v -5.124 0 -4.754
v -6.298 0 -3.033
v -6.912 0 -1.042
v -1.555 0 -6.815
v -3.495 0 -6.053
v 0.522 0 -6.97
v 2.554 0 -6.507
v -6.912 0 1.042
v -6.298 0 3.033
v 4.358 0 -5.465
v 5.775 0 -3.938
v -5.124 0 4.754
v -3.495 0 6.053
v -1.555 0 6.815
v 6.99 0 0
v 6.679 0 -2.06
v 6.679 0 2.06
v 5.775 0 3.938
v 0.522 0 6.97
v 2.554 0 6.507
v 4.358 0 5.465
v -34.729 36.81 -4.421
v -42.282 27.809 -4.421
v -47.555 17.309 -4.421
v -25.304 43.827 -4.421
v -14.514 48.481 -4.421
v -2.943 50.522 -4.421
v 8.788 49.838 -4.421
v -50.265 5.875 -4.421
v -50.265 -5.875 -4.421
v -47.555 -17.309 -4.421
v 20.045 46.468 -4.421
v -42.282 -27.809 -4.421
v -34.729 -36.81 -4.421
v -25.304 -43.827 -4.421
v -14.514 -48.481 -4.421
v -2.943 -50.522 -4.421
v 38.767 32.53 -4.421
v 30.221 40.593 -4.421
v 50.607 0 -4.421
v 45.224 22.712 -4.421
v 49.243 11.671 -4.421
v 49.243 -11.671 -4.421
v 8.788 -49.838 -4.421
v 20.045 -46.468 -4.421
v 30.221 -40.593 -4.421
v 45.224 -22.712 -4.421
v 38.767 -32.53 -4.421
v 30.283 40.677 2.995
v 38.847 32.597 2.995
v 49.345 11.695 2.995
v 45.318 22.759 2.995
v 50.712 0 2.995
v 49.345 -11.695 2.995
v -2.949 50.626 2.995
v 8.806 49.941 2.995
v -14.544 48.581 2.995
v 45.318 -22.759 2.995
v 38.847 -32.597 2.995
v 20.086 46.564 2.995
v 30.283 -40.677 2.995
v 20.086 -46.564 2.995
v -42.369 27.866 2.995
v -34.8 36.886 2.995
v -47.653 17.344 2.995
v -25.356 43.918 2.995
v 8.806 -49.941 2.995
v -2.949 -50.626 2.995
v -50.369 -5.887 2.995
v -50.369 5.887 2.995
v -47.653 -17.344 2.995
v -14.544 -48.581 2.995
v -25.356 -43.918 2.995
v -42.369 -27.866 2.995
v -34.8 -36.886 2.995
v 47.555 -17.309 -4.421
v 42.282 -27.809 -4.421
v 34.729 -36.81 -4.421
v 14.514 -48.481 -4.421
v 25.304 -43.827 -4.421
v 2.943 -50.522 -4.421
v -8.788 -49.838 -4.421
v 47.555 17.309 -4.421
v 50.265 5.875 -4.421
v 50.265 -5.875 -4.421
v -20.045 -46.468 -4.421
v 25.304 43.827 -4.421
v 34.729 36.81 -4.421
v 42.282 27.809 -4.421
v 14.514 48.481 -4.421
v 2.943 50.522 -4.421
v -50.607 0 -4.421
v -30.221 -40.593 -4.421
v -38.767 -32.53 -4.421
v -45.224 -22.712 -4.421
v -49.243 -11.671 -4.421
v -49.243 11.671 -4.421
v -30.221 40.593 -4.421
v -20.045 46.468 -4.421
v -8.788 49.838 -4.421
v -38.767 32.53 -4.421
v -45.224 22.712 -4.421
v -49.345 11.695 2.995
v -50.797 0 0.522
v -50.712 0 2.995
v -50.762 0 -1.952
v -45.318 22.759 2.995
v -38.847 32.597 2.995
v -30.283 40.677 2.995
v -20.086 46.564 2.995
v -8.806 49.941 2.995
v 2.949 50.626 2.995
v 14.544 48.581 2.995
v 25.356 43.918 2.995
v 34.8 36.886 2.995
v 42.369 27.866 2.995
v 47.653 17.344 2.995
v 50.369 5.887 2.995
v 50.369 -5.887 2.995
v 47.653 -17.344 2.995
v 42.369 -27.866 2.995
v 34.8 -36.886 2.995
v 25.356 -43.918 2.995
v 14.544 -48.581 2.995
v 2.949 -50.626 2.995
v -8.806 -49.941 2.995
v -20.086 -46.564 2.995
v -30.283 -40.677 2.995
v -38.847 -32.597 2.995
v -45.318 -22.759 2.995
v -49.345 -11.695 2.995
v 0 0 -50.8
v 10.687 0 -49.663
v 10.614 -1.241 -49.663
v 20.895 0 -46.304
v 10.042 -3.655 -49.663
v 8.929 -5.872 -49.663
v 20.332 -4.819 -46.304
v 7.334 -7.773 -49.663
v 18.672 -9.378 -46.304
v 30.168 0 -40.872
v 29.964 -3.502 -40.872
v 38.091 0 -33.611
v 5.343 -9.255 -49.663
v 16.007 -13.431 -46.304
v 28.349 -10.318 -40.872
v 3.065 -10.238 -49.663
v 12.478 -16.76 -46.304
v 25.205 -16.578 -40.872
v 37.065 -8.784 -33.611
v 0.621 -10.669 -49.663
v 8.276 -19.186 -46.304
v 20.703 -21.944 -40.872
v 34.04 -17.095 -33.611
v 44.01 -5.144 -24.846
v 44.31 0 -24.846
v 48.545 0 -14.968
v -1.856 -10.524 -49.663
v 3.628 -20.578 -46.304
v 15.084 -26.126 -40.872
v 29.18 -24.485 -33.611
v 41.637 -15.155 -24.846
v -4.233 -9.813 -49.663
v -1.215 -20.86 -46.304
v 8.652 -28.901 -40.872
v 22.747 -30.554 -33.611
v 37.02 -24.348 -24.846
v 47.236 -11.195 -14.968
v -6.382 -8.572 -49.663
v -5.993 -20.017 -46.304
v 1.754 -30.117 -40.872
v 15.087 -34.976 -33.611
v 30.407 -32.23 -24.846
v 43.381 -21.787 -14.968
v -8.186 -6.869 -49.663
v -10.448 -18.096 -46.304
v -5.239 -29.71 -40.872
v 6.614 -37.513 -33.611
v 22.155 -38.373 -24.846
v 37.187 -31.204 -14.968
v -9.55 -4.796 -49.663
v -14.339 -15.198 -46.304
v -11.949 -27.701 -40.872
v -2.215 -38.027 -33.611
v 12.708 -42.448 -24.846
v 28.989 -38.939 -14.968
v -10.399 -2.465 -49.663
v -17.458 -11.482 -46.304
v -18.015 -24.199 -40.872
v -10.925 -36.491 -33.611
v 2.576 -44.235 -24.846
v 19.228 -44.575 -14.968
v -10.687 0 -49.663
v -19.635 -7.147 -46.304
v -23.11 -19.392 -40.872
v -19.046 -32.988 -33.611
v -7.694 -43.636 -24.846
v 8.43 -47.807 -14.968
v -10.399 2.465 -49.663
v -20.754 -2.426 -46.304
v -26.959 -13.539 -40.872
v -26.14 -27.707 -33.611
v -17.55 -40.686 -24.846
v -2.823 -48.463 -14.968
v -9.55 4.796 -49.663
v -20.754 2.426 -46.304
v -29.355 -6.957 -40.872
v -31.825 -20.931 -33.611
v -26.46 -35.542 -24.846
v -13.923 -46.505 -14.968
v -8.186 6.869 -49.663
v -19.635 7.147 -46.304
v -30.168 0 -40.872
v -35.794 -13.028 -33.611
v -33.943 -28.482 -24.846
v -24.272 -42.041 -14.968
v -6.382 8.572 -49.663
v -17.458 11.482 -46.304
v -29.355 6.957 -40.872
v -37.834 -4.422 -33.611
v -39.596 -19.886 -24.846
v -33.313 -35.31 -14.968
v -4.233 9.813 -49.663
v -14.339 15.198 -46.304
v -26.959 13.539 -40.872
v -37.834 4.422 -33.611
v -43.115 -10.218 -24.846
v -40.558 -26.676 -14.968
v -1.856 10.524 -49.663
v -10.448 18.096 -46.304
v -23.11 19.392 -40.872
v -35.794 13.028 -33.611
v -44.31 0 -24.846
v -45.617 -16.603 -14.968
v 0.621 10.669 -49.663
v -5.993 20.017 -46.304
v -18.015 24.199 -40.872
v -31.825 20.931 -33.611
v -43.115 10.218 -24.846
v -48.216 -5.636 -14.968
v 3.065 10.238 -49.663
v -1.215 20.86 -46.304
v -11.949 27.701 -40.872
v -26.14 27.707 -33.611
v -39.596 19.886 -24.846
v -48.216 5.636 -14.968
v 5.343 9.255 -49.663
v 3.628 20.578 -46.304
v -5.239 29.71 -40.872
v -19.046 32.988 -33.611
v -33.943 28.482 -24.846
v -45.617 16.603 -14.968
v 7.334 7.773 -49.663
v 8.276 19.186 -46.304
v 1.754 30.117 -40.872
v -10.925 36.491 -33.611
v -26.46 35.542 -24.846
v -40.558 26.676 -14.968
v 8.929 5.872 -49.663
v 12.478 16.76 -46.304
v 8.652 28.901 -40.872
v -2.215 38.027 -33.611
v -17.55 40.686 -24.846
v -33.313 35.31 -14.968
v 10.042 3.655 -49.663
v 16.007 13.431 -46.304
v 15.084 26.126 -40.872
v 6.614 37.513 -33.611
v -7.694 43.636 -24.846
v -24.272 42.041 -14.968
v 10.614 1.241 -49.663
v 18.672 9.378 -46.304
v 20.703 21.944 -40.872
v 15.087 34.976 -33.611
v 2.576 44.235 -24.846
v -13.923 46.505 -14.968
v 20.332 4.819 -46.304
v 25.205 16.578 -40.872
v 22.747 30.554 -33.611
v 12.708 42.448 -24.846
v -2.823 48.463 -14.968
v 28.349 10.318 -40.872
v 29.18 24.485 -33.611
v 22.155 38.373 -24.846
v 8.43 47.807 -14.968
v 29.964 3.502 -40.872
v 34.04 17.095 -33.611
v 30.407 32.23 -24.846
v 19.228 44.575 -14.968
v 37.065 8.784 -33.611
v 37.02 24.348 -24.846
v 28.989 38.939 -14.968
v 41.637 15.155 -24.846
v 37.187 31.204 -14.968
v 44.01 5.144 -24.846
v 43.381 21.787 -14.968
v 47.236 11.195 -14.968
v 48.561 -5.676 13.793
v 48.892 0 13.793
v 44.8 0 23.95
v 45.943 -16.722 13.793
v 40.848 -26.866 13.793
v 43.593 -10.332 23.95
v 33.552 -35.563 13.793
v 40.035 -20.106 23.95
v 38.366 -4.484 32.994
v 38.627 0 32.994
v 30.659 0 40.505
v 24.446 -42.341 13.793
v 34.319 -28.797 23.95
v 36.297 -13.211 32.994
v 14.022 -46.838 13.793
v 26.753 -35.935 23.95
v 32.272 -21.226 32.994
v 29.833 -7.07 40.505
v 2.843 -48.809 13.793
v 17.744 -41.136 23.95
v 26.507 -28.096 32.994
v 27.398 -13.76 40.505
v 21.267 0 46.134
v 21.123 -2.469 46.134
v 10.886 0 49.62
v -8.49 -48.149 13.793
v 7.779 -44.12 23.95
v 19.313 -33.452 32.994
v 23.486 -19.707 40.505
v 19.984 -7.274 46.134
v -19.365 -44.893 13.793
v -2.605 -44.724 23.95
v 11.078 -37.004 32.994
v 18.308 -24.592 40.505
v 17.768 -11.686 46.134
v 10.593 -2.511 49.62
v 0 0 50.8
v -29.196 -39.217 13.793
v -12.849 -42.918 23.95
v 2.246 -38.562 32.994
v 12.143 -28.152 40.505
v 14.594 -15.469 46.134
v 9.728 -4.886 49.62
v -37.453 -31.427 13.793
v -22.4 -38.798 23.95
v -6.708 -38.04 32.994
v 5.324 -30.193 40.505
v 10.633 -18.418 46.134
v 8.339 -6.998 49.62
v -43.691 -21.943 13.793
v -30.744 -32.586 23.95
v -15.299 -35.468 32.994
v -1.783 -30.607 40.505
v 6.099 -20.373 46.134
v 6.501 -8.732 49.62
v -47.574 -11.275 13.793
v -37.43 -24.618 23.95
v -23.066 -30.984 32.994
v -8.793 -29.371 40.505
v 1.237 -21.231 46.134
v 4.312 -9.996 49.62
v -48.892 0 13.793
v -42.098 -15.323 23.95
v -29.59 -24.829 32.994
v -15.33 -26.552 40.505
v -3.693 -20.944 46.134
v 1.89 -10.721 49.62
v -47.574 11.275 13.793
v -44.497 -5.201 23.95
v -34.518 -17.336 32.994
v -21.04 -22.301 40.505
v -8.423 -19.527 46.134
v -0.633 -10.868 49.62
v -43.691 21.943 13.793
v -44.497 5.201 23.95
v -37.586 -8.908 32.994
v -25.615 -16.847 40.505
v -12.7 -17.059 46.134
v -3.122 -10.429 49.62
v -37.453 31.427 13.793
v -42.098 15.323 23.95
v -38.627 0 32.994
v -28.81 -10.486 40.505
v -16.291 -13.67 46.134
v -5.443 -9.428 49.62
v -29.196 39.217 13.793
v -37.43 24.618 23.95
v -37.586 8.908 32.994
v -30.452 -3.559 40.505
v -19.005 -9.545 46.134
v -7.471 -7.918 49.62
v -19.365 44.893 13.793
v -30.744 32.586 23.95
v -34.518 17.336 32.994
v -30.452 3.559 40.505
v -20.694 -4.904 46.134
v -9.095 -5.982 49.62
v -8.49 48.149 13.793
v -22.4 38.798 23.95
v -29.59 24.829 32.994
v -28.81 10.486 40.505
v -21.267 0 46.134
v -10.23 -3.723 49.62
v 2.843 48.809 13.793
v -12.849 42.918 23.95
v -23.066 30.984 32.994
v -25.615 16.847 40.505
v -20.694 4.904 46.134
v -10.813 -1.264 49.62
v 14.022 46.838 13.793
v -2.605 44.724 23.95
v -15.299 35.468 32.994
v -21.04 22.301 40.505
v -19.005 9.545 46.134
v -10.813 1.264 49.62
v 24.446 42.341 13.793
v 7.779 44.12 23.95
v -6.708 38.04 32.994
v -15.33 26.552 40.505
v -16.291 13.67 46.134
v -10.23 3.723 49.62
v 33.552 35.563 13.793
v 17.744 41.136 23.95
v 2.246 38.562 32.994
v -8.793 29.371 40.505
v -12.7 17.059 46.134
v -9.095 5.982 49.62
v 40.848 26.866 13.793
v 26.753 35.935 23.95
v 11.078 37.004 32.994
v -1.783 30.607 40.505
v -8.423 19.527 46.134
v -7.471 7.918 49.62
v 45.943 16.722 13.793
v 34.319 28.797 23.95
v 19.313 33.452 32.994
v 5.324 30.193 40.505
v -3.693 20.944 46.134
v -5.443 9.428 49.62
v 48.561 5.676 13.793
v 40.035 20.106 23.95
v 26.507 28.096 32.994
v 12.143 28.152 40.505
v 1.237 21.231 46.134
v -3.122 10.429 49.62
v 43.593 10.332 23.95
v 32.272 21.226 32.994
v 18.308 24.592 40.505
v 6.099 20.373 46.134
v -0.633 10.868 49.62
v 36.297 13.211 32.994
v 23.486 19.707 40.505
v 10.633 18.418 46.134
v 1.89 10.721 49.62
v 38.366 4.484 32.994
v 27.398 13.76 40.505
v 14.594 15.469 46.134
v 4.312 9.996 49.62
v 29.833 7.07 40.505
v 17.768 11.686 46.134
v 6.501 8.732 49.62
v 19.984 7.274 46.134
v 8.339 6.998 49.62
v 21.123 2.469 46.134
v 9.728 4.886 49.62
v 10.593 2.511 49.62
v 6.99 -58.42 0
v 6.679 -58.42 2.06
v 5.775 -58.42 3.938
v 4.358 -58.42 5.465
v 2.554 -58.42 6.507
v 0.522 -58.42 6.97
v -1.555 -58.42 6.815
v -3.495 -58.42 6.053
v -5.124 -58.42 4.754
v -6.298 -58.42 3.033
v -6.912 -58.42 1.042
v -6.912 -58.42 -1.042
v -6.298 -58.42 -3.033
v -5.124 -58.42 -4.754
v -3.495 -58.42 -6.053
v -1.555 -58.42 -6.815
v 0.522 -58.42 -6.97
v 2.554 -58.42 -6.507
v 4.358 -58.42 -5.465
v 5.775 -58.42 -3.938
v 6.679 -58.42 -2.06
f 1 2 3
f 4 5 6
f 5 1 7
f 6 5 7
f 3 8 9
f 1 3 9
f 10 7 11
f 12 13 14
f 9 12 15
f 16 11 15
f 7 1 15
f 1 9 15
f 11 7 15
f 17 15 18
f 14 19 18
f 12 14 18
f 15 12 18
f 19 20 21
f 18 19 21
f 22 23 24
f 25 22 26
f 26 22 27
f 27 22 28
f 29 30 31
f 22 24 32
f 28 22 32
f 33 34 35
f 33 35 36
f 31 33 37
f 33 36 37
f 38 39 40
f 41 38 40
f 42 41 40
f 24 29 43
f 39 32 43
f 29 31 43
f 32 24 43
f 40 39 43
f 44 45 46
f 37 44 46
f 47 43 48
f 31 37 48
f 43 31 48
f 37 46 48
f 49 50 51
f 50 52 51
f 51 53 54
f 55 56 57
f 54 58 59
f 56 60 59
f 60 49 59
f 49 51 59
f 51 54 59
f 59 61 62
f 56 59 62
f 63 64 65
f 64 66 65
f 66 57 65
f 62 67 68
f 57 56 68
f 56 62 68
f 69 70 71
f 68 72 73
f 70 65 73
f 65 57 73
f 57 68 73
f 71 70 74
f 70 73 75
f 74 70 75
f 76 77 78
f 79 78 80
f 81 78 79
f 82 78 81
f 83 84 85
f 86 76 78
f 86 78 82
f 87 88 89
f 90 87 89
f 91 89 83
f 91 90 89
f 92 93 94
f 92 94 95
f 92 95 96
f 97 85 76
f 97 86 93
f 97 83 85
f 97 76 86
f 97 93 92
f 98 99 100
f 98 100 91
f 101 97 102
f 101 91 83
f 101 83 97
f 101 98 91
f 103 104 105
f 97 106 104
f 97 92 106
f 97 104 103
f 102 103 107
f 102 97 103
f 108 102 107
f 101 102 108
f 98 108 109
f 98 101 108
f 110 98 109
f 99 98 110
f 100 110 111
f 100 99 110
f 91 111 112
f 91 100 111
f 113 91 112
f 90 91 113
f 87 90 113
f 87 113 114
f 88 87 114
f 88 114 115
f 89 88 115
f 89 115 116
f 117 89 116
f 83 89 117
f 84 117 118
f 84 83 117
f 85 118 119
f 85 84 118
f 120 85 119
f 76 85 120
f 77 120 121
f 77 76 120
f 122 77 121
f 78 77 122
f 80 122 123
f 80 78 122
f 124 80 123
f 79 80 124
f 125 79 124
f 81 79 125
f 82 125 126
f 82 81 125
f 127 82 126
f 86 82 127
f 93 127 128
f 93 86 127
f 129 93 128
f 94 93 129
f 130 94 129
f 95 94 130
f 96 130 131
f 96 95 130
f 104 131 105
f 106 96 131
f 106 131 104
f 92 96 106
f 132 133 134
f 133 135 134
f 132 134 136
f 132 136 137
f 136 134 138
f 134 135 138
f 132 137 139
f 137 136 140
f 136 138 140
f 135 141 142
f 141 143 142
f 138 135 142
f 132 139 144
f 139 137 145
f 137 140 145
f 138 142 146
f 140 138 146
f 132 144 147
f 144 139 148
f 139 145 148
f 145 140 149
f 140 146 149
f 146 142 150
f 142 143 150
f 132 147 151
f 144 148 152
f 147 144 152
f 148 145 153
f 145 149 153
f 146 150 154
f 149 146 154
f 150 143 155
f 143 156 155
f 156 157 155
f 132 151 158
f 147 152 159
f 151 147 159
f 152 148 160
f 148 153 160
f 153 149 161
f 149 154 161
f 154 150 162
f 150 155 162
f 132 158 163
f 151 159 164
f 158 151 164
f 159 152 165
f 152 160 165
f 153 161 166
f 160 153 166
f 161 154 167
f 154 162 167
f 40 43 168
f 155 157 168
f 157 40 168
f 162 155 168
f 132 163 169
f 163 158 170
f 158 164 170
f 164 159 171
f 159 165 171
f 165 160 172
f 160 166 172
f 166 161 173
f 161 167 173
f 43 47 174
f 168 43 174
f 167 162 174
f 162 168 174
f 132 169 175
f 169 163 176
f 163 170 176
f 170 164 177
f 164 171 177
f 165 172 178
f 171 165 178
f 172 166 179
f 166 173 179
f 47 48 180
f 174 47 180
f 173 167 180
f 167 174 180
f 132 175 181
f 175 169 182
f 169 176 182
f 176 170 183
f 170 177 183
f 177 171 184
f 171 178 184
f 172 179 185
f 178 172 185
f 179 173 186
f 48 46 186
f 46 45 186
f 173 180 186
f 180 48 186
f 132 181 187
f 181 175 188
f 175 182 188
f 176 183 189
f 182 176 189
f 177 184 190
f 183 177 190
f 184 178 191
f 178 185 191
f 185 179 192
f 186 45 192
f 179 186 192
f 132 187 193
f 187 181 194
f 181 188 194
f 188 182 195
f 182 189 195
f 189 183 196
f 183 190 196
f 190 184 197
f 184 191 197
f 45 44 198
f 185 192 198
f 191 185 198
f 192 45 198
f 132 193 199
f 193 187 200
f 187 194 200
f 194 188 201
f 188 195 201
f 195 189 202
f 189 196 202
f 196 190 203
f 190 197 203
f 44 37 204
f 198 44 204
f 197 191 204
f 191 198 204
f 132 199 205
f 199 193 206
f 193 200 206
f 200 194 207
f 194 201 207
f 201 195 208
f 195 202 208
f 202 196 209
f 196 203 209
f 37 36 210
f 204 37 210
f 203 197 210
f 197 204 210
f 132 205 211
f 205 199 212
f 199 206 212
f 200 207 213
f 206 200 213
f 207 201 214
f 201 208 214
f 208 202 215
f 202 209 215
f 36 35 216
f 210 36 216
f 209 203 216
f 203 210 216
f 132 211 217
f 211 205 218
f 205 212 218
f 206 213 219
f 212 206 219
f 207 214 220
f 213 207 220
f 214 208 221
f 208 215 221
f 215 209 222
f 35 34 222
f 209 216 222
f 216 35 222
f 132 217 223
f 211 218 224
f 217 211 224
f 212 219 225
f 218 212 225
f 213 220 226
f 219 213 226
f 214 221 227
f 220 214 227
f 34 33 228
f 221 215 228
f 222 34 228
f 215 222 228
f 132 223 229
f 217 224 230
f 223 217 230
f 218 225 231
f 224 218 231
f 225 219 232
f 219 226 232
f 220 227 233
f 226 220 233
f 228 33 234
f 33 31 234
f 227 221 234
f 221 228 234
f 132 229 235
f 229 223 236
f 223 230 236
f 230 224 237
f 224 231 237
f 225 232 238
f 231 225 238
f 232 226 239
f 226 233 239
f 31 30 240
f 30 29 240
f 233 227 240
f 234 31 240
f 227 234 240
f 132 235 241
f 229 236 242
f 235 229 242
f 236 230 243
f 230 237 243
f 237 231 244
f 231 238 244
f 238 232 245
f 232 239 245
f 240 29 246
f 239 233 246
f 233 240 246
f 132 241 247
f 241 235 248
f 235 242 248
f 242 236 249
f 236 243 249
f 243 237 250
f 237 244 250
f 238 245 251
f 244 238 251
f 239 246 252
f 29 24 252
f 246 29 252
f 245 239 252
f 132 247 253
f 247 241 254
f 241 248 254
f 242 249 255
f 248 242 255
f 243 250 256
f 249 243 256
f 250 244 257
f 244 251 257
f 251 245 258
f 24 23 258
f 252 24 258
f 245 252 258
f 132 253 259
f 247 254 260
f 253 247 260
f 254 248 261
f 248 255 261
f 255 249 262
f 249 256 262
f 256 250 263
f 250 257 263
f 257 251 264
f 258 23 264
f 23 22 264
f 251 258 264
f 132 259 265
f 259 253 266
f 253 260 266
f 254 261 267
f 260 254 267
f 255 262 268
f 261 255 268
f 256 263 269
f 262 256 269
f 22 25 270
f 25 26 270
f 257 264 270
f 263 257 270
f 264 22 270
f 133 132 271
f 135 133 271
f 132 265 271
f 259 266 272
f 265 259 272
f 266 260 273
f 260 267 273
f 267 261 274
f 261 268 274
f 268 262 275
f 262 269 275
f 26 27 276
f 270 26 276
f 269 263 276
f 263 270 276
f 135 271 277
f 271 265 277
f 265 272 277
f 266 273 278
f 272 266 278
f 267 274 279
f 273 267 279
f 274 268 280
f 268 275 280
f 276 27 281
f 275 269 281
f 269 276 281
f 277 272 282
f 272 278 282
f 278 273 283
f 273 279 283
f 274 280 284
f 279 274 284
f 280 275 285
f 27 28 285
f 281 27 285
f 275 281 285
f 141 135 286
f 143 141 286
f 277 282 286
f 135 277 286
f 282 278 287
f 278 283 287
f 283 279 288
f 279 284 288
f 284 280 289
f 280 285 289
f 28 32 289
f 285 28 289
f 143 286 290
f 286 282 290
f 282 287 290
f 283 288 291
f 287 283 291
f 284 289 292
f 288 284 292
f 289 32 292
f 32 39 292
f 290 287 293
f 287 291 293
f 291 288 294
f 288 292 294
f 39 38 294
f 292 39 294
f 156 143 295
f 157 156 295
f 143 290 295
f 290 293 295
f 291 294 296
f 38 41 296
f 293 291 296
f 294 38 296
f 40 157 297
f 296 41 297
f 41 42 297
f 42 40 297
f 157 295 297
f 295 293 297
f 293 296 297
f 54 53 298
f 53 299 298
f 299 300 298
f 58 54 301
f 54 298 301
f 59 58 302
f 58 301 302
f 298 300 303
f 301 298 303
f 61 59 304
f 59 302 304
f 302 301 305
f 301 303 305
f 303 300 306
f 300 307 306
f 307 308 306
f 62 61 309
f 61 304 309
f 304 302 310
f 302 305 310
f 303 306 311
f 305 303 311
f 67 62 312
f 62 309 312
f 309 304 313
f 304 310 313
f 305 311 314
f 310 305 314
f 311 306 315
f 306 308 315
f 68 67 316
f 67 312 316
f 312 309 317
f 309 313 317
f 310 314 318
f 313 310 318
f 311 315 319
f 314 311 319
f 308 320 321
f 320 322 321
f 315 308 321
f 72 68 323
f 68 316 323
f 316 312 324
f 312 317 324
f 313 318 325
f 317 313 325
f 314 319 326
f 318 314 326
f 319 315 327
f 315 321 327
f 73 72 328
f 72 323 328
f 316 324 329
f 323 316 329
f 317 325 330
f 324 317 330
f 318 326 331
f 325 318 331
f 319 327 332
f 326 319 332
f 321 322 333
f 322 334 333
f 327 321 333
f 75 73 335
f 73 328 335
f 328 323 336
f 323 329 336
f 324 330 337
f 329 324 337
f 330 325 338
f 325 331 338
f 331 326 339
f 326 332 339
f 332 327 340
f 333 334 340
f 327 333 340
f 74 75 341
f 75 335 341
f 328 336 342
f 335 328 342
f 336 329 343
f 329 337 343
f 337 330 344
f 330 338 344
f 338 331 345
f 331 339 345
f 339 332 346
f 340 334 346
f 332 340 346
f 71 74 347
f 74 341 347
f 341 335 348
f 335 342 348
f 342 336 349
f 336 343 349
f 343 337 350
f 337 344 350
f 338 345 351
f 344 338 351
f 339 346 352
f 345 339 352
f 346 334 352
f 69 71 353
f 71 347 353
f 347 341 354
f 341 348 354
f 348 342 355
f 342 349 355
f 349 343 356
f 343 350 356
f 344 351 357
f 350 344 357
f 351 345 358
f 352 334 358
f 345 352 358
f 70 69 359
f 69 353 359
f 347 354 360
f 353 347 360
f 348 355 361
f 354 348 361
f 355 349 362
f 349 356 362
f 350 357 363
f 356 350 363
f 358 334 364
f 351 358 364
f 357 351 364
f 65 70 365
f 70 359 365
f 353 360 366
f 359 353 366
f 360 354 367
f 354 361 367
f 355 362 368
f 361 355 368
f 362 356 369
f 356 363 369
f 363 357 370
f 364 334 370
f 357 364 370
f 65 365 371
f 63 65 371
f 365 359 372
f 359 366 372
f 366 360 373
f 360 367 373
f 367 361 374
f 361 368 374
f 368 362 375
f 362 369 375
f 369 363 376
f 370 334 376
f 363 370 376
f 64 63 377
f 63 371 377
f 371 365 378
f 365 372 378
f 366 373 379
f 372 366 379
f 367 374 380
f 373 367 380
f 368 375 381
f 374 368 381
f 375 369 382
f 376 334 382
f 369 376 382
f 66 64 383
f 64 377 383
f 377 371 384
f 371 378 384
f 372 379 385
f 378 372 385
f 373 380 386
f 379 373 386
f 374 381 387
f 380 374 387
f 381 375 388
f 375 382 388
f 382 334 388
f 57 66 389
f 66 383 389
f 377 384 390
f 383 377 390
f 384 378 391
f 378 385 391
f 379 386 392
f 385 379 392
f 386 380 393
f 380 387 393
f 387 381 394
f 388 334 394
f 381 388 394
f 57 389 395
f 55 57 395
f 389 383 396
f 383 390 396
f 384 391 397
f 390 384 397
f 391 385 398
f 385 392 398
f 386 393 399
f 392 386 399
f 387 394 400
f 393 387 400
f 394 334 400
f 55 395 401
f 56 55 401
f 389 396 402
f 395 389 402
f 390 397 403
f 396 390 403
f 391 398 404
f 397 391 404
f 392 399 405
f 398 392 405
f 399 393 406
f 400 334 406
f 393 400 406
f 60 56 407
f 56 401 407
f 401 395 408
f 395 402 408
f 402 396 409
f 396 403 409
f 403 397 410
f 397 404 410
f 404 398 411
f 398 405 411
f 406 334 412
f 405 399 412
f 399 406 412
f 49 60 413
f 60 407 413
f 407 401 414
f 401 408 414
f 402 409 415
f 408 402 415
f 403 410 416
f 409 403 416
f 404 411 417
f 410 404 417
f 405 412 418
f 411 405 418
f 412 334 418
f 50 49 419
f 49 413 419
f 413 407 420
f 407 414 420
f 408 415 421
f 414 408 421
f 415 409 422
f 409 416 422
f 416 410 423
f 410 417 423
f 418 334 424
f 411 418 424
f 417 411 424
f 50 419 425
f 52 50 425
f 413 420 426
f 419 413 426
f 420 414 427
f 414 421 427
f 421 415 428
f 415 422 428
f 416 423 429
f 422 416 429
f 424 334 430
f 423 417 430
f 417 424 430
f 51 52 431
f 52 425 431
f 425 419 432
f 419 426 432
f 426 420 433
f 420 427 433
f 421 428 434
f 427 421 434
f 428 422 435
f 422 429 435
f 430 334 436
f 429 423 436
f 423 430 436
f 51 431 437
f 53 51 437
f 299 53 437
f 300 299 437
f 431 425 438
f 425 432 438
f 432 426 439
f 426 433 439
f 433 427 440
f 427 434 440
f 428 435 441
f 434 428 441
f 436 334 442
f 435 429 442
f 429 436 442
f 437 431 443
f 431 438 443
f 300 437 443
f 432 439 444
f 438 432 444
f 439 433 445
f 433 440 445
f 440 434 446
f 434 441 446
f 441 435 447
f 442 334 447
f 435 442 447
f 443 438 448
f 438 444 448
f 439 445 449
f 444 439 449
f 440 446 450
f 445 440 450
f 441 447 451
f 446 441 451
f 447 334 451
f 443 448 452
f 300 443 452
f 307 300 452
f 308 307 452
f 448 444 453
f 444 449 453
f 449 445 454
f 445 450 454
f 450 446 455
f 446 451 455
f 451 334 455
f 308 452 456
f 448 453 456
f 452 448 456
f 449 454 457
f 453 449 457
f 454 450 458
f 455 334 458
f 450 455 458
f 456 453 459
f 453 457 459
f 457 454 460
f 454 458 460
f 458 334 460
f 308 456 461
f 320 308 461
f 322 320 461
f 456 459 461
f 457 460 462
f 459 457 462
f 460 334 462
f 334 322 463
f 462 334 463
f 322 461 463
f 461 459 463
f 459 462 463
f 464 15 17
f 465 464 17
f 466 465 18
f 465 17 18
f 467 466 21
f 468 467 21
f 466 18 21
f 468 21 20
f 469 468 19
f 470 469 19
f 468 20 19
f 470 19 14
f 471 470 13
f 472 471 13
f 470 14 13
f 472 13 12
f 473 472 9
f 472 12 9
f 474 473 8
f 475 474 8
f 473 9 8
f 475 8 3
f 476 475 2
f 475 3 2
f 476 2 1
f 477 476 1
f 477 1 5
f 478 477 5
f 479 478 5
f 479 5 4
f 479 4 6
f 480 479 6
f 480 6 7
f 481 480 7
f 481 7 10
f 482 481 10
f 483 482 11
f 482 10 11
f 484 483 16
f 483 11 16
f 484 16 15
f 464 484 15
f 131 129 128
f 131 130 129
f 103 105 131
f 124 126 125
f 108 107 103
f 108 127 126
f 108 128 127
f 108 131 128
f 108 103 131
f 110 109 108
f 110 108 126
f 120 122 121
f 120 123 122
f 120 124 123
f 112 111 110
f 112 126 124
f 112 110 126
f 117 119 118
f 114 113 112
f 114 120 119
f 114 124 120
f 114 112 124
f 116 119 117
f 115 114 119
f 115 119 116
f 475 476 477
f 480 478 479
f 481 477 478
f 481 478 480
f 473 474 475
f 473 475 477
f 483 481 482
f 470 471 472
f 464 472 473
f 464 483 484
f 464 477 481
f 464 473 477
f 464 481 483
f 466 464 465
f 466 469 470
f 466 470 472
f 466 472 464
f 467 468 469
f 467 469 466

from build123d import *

# Parameters (mm, degrees)
F5_R     = 6.9898511366
F6_DEPTH = 58.42


# Not quite as in the source:
# - a feature names something its author has since deleted; it is built from what else it names


with BuildPart() as f1:
    # F0 (on Front) → F1 (revolve)
    with BuildSketch(Plane.XZ):
        with BuildLine():
            Line((0, 2.9950267635), (50.7116339185, 2.9950267635))
            ThreePointArc((50.7116339185, 2.9950267635), (34.8460373673, 36.9647626774), (0, 50.8))
            Line((0, 50.8), (0, 2.9950267635))
        make_face()
    revolve(axis=Axis((0, 0, -2.1393038332), (0, 0, -1)))


with BuildPart() as f1b:
    # F0 (on Front) → F1, piece 2 (revolve)
    with BuildSketch(Plane.XZ):
        with BuildLine():
            ThreePointArc((0, -50.8), (34.3223070251, -37.4515585854), (50.6072398558, -4.4212299399))
            Line((50.6072398558, -4.4212299399), (0, -4.4212299399))
            Line((0, -4.4212299399), (0, -50.8))
        make_face()
    revolve(axis=Axis((0, 0, -2.1393038332), (0, 0, -1)))


with BuildPart() as f3:
    # F0 (on Front) → F3 (revolve)
    with BuildSketch(Plane.XZ):
        with BuildLine():
            Line((0, -4.4212299399), (0, 2.9950267635))
            Line((0, 2.9950267635), (-50.7116339185, 2.9950267635))
            ThreePointArc((-50.7116339185, 2.9950267635), (-50.7949678767, -0.7150093742), (-50.6072398558, -4.4212299399))
            Line((-50.6072398558, -4.4212299399), (0, -4.4212299399))
        make_face()
    revolve(axis=Axis((0, 0, -2.5671664625), (0, 0, -1)))


with BuildPart() as f6:
    # F5 (on Front) → F6 (new body)
    with BuildSketch(Plane.XZ):
        Circle(F5_R)
    extrude(amount=F6_DEPTH)


solid = Compound([f1.part, f1b.part, f3.part, f6.part])
